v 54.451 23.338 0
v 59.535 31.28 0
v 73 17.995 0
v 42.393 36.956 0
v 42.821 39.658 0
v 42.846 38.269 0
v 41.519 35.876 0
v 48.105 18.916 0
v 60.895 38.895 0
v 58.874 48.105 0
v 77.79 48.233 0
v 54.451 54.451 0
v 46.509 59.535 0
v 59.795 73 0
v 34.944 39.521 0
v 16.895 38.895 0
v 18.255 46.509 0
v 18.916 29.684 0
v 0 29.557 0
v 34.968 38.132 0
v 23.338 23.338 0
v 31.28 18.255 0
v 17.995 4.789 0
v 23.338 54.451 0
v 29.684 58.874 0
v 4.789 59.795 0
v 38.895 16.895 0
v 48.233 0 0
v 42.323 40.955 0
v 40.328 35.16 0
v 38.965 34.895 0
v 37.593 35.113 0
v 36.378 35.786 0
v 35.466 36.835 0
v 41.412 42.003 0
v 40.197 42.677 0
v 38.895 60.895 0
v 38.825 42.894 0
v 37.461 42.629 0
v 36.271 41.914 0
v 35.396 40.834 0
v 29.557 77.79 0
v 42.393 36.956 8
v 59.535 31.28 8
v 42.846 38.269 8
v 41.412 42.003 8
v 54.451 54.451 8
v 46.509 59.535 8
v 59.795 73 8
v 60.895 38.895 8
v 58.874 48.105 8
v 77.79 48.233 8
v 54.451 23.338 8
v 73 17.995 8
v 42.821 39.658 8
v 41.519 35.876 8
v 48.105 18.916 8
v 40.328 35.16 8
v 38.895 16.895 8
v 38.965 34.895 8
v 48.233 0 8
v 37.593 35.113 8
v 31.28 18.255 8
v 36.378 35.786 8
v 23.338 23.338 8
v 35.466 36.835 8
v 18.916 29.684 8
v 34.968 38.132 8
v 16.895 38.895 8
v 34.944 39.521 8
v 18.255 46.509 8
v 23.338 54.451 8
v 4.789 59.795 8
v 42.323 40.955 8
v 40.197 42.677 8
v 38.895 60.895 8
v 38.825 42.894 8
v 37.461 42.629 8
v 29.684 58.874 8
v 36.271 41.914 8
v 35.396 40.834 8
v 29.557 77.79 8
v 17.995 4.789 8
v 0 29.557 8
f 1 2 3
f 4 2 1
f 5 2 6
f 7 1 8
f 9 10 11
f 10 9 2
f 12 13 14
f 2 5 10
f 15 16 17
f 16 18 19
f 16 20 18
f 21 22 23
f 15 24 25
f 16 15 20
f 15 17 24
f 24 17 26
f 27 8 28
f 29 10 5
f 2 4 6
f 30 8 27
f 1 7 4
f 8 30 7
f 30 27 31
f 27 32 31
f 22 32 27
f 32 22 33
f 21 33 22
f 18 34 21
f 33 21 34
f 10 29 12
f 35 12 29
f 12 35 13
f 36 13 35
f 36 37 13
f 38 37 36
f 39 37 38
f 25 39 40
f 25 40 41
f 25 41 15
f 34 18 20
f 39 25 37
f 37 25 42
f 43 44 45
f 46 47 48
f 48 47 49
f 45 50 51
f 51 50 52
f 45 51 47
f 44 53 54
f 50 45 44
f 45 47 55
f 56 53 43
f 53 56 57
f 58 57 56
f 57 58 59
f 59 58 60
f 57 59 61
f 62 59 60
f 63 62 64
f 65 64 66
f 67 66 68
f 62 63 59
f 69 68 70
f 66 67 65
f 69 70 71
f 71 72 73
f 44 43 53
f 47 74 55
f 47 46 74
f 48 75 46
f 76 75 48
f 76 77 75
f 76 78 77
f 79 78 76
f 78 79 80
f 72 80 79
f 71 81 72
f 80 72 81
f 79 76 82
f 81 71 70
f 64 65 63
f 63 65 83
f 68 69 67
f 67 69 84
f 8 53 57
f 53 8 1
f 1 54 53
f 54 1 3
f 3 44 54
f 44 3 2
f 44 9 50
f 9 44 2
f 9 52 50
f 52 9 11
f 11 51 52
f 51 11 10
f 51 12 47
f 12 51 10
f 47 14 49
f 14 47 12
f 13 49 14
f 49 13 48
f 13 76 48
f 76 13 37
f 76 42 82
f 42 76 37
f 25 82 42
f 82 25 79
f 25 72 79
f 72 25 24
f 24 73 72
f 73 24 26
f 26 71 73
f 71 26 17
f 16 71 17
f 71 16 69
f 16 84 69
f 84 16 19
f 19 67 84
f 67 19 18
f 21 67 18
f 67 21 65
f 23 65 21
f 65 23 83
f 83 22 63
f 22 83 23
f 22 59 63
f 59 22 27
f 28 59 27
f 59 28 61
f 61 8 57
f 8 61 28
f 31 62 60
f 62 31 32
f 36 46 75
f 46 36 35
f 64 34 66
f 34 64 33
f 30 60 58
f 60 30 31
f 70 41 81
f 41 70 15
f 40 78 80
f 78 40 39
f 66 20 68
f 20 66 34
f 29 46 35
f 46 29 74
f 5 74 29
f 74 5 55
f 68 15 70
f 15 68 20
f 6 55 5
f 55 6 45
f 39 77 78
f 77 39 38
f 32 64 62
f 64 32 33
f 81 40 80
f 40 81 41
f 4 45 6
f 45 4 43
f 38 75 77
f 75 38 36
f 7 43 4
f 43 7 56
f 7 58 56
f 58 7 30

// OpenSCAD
$fn = 32;

// ----------------------------------------------------------------------
// Star wheel: 8-point ratchet, R40
// ----------------------------------------------------------------------

// --- parameters (mm) ---
n_points = 8;             // number of points / teeth
r_out = 40;               // tip radius
r_in = 22;                // root radius
bore_r = 4;               // centre bore radius
plate_t = 8;              // plate thickness, Z (extrusion height)
bore_d = 8;               // centre bore diameter

profile = [[60.895, 38.895], [77.79, 48.233], [58.874, 48.105], [54.451, 54.451], [59.795, 73], [46.509, 59.535], [38.895, 60.895], [29.557, 77.79], [29.684, 58.874], [23.338, 54.451], [4.789, 59.795], [18.255, 46.509], [16.895, 38.895], [0, 29.557], [18.916, 29.684], [23.338, 23.338], [17.995, 4.789], [31.28, 18.255], [38.895, 16.895], [48.233, 0], [48.105, 18.916], [54.451, 23.338], [73, 17.995], [59.535, 31.28]];  // primary outline, 24 points, counter clockwise
void_1 = [[42.821, 39.658], [42.323, 40.955], [41.412, 42.003], [40.197, 42.677], [38.825, 42.894], [37.461, 42.629], [36.271, 41.914], [35.396, 40.834], [34.944, 39.521], [34.968, 38.132], [35.466, 36.835], [36.378, 35.786], [37.593, 35.113], [38.965, 34.895], [40.328, 35.16], [41.519, 35.876], [42.393, 36.956], [42.846, 38.269]];  // centre bore, 18 points

// --- the one profile operation ---
difference() {
  linear_extrude(height = plate_t) polygon(points = profile);
  translate([0, 0, -1])
    linear_extrude(height = plate_t + 2) polygon(points = void_1);
}
